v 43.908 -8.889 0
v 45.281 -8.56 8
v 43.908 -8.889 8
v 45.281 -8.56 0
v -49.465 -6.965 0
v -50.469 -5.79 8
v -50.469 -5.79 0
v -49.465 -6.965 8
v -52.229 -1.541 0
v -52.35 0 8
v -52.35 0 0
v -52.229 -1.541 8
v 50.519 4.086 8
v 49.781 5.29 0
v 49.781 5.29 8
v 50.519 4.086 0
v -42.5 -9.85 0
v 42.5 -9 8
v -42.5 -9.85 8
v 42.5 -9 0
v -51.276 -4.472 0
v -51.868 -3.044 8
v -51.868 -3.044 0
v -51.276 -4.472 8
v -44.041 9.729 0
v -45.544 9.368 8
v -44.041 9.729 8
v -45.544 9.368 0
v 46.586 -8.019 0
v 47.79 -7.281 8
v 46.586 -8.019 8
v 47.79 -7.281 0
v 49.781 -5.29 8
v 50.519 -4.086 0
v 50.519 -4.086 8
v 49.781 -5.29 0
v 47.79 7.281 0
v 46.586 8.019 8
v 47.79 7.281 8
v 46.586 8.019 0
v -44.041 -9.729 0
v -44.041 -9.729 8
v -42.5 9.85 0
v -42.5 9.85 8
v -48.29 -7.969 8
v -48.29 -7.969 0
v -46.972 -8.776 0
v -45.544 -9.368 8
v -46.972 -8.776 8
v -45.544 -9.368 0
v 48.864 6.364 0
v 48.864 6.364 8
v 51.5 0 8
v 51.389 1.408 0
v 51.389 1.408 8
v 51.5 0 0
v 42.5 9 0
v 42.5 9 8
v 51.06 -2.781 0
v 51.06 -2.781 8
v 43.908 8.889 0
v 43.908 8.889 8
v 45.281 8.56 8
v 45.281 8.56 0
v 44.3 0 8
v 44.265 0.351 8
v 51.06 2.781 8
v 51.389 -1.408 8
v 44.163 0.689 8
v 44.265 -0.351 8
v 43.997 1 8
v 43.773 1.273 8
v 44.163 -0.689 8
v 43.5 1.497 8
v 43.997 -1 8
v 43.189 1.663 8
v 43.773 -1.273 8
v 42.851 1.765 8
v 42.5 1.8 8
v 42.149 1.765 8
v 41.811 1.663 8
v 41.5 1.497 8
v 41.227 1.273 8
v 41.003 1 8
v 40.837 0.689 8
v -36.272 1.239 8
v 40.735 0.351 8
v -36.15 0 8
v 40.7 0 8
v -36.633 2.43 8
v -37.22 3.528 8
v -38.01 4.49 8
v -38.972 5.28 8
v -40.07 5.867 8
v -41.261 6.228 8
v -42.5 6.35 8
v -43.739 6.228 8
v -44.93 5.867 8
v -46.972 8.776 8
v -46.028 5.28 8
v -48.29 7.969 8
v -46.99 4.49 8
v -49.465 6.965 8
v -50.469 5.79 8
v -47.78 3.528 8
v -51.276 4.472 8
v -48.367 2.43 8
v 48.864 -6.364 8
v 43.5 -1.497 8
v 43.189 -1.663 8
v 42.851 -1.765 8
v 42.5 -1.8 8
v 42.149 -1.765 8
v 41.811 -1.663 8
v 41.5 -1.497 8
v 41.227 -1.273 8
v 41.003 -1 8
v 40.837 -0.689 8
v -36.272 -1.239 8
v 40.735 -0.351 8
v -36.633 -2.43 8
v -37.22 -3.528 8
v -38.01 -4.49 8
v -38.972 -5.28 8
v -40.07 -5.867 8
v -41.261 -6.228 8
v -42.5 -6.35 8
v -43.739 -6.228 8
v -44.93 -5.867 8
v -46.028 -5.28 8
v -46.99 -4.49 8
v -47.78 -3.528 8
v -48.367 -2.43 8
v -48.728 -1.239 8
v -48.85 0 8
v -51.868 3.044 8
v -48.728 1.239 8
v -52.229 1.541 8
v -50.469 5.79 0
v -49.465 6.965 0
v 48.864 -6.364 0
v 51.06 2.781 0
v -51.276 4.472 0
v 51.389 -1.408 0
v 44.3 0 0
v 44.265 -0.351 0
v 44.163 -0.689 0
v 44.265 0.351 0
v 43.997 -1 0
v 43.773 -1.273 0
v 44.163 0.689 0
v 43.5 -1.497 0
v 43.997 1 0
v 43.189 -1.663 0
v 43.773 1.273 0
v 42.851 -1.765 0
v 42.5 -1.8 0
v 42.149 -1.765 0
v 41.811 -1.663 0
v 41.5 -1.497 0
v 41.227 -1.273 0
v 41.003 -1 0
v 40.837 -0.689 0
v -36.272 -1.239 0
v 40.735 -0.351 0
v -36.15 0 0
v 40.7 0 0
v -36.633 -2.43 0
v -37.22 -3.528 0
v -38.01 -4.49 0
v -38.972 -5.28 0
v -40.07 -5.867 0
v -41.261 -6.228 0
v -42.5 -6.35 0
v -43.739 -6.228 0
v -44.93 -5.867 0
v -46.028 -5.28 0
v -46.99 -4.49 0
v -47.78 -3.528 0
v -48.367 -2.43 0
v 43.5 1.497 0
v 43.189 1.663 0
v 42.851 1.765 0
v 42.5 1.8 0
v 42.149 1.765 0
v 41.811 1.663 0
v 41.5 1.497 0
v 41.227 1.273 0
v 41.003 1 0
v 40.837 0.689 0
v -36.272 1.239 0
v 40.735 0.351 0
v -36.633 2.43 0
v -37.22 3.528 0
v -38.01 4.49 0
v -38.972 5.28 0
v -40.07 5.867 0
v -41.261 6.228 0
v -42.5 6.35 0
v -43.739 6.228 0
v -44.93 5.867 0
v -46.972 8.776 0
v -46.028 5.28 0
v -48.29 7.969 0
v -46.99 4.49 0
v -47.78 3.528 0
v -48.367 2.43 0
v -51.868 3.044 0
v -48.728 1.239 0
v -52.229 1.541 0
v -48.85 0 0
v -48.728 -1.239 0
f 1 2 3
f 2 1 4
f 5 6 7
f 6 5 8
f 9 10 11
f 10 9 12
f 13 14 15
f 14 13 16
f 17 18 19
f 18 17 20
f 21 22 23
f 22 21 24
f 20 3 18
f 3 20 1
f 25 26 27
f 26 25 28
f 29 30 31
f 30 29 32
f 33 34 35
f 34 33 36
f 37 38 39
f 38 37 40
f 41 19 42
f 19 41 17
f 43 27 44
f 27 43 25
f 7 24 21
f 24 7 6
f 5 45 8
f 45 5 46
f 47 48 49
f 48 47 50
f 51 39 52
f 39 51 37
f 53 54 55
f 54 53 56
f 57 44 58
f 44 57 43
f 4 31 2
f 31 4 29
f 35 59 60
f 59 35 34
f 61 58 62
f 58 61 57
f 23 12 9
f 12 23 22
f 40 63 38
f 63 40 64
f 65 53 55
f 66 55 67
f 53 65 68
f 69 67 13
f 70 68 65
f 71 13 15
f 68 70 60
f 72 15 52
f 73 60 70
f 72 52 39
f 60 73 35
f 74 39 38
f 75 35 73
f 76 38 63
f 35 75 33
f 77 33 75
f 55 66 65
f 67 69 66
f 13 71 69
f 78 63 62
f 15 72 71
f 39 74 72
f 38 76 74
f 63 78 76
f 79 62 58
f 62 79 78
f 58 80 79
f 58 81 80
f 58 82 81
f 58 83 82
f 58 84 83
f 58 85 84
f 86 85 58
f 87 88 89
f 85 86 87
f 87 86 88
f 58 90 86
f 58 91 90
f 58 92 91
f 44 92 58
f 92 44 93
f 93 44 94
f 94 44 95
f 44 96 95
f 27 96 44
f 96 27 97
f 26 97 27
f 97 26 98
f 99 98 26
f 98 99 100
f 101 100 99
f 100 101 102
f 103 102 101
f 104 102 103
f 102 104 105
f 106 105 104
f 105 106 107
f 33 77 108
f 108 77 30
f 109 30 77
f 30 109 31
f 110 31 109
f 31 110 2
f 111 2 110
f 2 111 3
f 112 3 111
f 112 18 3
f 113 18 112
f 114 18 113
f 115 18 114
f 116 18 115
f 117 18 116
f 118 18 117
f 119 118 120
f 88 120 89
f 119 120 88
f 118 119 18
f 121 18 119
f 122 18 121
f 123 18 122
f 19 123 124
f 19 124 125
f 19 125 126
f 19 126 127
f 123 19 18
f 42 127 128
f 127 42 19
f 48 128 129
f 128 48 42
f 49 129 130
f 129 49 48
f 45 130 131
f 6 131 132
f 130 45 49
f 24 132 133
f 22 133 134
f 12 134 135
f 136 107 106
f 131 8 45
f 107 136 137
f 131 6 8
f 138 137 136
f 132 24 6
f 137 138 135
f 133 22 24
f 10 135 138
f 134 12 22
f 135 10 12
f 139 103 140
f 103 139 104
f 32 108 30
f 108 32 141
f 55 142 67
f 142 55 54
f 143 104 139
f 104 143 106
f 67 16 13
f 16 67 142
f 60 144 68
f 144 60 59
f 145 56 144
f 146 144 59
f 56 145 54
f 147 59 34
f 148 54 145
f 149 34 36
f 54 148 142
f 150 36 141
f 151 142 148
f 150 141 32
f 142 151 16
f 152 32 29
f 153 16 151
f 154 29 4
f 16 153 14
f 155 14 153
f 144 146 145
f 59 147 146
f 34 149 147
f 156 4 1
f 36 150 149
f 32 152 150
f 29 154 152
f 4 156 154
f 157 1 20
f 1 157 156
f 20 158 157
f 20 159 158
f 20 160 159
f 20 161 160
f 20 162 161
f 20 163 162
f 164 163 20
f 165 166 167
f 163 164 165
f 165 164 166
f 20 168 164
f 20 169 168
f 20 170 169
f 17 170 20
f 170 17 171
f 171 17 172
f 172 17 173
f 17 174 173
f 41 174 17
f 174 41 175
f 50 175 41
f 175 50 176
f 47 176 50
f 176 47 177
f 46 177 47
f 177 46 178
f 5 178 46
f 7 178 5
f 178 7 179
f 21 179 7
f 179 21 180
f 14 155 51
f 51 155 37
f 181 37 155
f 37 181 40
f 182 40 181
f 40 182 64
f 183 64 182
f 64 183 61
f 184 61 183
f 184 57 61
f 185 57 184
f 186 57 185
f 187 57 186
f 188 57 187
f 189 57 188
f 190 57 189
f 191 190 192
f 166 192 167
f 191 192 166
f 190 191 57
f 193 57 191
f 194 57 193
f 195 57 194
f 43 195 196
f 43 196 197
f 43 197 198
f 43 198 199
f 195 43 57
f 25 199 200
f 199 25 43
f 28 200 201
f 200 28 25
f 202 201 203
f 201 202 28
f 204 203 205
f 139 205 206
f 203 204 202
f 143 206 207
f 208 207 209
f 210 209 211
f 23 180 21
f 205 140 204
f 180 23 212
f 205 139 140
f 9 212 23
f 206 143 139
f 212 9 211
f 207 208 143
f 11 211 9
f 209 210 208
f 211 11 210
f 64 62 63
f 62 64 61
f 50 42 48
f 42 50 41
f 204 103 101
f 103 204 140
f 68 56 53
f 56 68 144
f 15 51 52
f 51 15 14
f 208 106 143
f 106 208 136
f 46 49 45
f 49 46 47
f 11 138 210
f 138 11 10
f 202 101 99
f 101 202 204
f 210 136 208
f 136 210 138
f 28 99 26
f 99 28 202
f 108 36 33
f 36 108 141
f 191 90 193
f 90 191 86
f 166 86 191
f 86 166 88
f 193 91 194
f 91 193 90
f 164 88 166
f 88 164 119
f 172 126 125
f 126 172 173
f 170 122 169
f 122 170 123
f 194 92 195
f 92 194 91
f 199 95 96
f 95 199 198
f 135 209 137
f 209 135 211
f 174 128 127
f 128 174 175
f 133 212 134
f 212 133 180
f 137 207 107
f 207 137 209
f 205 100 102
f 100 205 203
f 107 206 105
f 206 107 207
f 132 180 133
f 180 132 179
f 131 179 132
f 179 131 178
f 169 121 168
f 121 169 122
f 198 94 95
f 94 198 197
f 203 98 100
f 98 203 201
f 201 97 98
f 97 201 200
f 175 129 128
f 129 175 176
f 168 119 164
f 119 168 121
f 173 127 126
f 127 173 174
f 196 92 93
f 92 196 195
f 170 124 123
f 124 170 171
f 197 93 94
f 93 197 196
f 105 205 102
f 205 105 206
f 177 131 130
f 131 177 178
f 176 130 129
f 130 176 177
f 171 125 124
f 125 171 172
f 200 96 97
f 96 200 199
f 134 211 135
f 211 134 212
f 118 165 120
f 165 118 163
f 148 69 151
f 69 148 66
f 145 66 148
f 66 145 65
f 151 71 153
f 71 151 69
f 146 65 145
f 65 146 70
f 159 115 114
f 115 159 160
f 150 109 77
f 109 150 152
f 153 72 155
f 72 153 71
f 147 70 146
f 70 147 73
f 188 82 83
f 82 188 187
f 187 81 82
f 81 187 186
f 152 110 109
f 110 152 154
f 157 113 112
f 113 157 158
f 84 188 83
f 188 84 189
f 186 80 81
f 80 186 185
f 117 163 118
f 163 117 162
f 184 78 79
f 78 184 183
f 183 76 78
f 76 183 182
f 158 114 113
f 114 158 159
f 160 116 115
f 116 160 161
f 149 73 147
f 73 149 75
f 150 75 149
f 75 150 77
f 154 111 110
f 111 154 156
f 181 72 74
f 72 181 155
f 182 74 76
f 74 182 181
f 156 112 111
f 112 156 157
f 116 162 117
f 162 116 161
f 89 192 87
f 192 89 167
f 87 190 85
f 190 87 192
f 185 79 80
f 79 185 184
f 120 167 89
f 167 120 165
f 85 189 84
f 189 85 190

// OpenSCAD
$fn = 32;

// ----------------------------------------------------------------------
// Lever: 85 mm between the bosses, 8 mm thick, smooth outline
// ----------------------------------------------------------------------

// --- parameters (mm) ---
lever_l = 85;             // distance between the boss centres
boss_a = 19.7;            // first boss diameter
boss_b = 18;              // second boss diameter
bore_a = 12.7;            // first bore
bore_b = 3.6;             // second bore
lever_t = 8;              // lever thickness

lever_profile = [[-52.35, 0], [-52.229, -1.541], [-51.868, -3.044], [-51.276, -4.472], [-50.469, -5.79], [-49.465, -6.965], [-48.29, -7.969], [-46.972, -8.776], [-45.544, -9.368], [-44.041, -9.729], [-42.5, -9.85], [42.5, -9], [43.908, -8.889], [45.281, -8.56], [46.586, -8.019], [47.79, -7.281], [48.864, -6.364], [49.781, -5.29], [50.519, -4.086], [51.06, -2.781], [51.389, -1.408], [51.5, 0], [51.389, 1.408], [51.06, 2.781], [50.519, 4.086], [49.781, 5.29], [48.864, 6.364], [47.79, 7.281], [46.586, 8.019], [45.281, 8.56], [43.908, 8.889], [42.5, 9], [-42.5, 9.85], [-44.041, 9.729], [-45.544, 9.368], [-46.972, 8.776], [-48.29, 7.969], [-49.465, 6.965], [-50.469, 5.79], [-51.276, 4.472], [-51.868, 3.044], [-52.229, 1.541]];

difference() {
  linear_extrude(height = lever_t) polygon(lever_profile);
  translate([-42.5, 0, -2.5]) cylinder(h = lever_t + 5, d = bore_a);
  translate([42.5, 0, -2.5]) cylinder(h = lever_t + 5, d = bore_b);
}
